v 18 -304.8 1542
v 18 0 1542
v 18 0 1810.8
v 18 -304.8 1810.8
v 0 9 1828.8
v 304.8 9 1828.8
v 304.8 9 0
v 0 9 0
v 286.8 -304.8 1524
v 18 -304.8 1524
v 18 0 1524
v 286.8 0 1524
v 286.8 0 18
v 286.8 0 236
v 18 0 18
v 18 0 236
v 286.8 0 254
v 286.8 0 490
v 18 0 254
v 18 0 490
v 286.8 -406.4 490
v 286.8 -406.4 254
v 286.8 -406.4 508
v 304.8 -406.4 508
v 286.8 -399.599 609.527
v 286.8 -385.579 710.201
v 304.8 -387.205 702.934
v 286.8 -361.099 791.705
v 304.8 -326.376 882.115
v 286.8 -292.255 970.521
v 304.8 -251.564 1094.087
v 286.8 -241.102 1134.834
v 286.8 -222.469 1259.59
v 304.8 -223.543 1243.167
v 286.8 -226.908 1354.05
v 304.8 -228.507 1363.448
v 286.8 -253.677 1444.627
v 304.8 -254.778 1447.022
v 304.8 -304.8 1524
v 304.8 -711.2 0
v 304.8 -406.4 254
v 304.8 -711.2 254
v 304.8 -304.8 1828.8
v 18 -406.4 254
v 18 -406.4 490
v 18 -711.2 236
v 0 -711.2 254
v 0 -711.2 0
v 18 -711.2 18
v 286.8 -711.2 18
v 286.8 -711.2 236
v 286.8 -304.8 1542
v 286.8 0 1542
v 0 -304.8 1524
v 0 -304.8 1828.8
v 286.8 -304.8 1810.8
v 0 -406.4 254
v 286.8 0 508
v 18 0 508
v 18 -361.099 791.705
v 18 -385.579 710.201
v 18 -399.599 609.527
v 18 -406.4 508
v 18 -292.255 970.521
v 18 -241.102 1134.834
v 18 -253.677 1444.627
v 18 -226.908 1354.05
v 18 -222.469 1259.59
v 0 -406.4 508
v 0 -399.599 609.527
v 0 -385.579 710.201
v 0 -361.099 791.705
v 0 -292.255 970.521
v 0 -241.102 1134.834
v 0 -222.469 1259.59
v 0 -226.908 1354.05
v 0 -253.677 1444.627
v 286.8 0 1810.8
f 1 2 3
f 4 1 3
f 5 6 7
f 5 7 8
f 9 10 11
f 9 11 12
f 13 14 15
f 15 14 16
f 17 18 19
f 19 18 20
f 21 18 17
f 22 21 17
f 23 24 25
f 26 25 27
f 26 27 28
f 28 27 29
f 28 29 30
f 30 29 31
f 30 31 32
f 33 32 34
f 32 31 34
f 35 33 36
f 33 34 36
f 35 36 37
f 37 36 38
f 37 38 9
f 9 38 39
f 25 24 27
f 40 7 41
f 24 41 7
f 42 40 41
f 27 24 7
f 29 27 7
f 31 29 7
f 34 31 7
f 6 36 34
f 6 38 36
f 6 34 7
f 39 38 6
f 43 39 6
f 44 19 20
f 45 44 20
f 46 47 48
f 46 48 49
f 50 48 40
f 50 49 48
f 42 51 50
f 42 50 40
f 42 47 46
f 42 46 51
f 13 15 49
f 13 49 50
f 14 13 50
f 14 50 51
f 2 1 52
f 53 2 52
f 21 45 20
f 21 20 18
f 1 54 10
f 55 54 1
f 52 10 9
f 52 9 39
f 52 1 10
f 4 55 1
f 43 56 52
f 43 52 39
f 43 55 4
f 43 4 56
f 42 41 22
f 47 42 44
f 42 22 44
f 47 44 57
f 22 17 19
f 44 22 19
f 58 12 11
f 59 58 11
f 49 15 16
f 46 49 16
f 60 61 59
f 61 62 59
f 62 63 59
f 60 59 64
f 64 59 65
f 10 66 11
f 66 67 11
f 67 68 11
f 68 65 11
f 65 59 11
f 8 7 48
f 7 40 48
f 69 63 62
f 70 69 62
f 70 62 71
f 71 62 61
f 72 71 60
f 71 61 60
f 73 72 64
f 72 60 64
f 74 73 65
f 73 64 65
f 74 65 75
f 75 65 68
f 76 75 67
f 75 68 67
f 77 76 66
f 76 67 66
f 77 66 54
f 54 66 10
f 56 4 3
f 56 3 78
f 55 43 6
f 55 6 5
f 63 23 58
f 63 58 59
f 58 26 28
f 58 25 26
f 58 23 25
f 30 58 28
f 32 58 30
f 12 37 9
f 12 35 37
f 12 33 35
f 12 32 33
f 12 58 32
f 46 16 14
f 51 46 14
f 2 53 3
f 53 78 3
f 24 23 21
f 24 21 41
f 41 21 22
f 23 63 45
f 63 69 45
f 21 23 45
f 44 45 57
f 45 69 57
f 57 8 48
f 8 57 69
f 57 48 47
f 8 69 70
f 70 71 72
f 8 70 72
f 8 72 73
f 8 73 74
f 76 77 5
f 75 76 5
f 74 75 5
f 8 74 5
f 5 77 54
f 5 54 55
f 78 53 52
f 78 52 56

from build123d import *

# Parameters (mm, degrees)
F0_W      = 268.8
F0_H      = 218
F4_DEPTH  = 711.2
F5_DEPTH  = 406.4
F2_W      = 268.8
F2_H      = 268.8
F6_DEPTH  = 304.8
F3_W      = 18
F3_H      = 1016
F7_DEPTH  = 406.4
F9_DEPTH  = 25.4
F10_DEPTH = 330.201
F11_W     = 304.8
F11_H     = 1828.8
F12_DEPTH = 9


with BuildPart() as f4:
    # F0 (on Front) → F4 (new body)
    with BuildSketch(Plane.XZ):
        Polygon((0, 254), (0, 0), (304.8, 0), (304.8, 254), (286.8, 254), (18, 254), align=None)
        with Locations((152.4, 127)):
            Rectangle(F0_W, F0_H, mode=Mode.SUBTRACT)
    extrude(amount=F4_DEPTH)

    # F1 (on face) → F5 (join)
    with BuildSketch(Plane.XZ):
        Polygon((0, 254), (18, 254), (18, 490), (286.8, 490), (286.8, 254), (304.8, 254), (304.8, 508), (0, 508), align=None)
    extrude(amount=F5_DEPTH)



with BuildPart() as f6:
    # F2 (on face) → F6 (new body)
    with BuildSketch(Plane.XZ):
        Polygon((286.8, 1524), (304.8, 1524), (304.8, 1828.8), (0, 1828.8), (0, 1524), (18, 1524), align=None)
        with Locations((152.4, 1676.4)):
            Rectangle(F2_W, F2_H, mode=Mode.SUBTRACT)
    extrude(amount=F6_DEPTH)


with BuildPart() as f4_1:
    add(f4.part)

    add(f6.part)  # F7 merges F6
    # F3 (on face) → F7 (join)
    with BuildSketch(Plane.XZ):
        with Locations((9, 1016)):
            Rectangle(F3_W, F3_H)
        with Locations((295.8, 1016)):
            Rectangle(F3_W, F3_H)
    extrude(amount=F7_DEPTH)

    # F8 (on face) → F9 (join)
    with BuildSketch(Plane.YZ.offset(304.8)):
        with BuildLine():
            Line((-406.4, 1524), (-406.4, 508))
            add(Edge.make_bspline(
                [(-406.4, 508), (-396.8275922681, 598.5997341904), (-421.7207556926, 754.4937009727), (-111.9974998318, 1301.6475166208), (-304.8, 1524)],
                knots=[0, 0, 0, 0, 0.3701888658, 1, 1, 1, 1], degree=3))
            Line((-304.8, 1524), (-406.4, 1524))
        make_face()
    extrude(amount=F9_DEPTH)

    # F10 (cut, through all): a face of the model
    f10_faces = [f4_1.faces().sort_by_distance(p)[0] for p in [
        (330.2, -333.081689218, 1181.2920235829),
    ]]
    extrude(f10_faces, amount=-F10_DEPTH, mode=Mode.SUBTRACT)

    # F11 (on face) → F12 (join)
    with BuildSketch(Plane(origin=(0, 0, 0), x_dir=(-1, 0, 0), z_dir=(0, 1, 0))):
        with Locations((-152.4, 914.4)):
            Rectangle(F11_W, F11_H)
    extrude(amount=F12_DEPTH)


solid = f4_1.part
